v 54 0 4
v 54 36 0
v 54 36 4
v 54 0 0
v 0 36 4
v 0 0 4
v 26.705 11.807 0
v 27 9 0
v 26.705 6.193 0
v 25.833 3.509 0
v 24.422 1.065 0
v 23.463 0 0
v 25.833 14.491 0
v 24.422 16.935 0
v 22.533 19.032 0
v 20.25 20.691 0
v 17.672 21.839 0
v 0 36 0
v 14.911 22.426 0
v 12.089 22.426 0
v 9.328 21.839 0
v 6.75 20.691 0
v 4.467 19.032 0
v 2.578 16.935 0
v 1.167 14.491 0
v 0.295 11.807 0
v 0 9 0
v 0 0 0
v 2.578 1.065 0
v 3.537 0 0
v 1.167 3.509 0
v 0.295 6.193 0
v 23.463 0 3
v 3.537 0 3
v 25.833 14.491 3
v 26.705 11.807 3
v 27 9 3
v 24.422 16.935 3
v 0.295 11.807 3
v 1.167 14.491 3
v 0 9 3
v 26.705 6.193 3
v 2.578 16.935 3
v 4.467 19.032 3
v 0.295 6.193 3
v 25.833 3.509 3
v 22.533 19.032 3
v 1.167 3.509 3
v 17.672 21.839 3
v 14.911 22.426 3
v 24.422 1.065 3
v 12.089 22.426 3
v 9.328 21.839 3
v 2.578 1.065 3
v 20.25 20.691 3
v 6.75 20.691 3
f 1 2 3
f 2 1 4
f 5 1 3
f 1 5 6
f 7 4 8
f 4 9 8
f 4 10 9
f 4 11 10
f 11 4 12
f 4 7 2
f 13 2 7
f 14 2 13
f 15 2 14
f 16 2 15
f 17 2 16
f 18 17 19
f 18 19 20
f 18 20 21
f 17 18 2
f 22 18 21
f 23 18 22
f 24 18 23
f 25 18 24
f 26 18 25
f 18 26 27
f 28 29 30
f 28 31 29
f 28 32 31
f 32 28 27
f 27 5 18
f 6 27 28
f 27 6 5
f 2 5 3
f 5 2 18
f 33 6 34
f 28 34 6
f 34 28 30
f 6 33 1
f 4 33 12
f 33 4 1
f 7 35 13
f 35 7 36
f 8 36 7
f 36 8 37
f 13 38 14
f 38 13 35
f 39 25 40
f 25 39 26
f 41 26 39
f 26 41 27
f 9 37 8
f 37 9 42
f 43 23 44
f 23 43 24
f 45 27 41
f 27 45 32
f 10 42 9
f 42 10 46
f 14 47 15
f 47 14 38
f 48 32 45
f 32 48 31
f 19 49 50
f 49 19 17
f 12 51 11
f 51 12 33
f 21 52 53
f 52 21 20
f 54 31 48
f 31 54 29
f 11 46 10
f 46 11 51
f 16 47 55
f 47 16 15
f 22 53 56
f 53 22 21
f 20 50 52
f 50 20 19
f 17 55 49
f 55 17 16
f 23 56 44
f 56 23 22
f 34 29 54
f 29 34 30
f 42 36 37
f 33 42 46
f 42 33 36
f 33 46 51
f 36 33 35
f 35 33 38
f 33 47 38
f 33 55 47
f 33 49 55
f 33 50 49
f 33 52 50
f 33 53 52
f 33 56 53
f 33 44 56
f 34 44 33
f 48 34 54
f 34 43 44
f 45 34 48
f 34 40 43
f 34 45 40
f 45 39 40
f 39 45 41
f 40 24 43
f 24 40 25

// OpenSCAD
module rectangular_plate(width, height, depth) {
  difference() {
    cube([width, height, depth]);
    translate([width/4, height/4, depth/4])
    cylinder(h=depth, r=width/4, center=true);
    translate([width/4, height/4, depth/4])
    cylinder(h=depth, r=height/4, center=true);
  }
}

rectangular_plate(54, 36, 4);
